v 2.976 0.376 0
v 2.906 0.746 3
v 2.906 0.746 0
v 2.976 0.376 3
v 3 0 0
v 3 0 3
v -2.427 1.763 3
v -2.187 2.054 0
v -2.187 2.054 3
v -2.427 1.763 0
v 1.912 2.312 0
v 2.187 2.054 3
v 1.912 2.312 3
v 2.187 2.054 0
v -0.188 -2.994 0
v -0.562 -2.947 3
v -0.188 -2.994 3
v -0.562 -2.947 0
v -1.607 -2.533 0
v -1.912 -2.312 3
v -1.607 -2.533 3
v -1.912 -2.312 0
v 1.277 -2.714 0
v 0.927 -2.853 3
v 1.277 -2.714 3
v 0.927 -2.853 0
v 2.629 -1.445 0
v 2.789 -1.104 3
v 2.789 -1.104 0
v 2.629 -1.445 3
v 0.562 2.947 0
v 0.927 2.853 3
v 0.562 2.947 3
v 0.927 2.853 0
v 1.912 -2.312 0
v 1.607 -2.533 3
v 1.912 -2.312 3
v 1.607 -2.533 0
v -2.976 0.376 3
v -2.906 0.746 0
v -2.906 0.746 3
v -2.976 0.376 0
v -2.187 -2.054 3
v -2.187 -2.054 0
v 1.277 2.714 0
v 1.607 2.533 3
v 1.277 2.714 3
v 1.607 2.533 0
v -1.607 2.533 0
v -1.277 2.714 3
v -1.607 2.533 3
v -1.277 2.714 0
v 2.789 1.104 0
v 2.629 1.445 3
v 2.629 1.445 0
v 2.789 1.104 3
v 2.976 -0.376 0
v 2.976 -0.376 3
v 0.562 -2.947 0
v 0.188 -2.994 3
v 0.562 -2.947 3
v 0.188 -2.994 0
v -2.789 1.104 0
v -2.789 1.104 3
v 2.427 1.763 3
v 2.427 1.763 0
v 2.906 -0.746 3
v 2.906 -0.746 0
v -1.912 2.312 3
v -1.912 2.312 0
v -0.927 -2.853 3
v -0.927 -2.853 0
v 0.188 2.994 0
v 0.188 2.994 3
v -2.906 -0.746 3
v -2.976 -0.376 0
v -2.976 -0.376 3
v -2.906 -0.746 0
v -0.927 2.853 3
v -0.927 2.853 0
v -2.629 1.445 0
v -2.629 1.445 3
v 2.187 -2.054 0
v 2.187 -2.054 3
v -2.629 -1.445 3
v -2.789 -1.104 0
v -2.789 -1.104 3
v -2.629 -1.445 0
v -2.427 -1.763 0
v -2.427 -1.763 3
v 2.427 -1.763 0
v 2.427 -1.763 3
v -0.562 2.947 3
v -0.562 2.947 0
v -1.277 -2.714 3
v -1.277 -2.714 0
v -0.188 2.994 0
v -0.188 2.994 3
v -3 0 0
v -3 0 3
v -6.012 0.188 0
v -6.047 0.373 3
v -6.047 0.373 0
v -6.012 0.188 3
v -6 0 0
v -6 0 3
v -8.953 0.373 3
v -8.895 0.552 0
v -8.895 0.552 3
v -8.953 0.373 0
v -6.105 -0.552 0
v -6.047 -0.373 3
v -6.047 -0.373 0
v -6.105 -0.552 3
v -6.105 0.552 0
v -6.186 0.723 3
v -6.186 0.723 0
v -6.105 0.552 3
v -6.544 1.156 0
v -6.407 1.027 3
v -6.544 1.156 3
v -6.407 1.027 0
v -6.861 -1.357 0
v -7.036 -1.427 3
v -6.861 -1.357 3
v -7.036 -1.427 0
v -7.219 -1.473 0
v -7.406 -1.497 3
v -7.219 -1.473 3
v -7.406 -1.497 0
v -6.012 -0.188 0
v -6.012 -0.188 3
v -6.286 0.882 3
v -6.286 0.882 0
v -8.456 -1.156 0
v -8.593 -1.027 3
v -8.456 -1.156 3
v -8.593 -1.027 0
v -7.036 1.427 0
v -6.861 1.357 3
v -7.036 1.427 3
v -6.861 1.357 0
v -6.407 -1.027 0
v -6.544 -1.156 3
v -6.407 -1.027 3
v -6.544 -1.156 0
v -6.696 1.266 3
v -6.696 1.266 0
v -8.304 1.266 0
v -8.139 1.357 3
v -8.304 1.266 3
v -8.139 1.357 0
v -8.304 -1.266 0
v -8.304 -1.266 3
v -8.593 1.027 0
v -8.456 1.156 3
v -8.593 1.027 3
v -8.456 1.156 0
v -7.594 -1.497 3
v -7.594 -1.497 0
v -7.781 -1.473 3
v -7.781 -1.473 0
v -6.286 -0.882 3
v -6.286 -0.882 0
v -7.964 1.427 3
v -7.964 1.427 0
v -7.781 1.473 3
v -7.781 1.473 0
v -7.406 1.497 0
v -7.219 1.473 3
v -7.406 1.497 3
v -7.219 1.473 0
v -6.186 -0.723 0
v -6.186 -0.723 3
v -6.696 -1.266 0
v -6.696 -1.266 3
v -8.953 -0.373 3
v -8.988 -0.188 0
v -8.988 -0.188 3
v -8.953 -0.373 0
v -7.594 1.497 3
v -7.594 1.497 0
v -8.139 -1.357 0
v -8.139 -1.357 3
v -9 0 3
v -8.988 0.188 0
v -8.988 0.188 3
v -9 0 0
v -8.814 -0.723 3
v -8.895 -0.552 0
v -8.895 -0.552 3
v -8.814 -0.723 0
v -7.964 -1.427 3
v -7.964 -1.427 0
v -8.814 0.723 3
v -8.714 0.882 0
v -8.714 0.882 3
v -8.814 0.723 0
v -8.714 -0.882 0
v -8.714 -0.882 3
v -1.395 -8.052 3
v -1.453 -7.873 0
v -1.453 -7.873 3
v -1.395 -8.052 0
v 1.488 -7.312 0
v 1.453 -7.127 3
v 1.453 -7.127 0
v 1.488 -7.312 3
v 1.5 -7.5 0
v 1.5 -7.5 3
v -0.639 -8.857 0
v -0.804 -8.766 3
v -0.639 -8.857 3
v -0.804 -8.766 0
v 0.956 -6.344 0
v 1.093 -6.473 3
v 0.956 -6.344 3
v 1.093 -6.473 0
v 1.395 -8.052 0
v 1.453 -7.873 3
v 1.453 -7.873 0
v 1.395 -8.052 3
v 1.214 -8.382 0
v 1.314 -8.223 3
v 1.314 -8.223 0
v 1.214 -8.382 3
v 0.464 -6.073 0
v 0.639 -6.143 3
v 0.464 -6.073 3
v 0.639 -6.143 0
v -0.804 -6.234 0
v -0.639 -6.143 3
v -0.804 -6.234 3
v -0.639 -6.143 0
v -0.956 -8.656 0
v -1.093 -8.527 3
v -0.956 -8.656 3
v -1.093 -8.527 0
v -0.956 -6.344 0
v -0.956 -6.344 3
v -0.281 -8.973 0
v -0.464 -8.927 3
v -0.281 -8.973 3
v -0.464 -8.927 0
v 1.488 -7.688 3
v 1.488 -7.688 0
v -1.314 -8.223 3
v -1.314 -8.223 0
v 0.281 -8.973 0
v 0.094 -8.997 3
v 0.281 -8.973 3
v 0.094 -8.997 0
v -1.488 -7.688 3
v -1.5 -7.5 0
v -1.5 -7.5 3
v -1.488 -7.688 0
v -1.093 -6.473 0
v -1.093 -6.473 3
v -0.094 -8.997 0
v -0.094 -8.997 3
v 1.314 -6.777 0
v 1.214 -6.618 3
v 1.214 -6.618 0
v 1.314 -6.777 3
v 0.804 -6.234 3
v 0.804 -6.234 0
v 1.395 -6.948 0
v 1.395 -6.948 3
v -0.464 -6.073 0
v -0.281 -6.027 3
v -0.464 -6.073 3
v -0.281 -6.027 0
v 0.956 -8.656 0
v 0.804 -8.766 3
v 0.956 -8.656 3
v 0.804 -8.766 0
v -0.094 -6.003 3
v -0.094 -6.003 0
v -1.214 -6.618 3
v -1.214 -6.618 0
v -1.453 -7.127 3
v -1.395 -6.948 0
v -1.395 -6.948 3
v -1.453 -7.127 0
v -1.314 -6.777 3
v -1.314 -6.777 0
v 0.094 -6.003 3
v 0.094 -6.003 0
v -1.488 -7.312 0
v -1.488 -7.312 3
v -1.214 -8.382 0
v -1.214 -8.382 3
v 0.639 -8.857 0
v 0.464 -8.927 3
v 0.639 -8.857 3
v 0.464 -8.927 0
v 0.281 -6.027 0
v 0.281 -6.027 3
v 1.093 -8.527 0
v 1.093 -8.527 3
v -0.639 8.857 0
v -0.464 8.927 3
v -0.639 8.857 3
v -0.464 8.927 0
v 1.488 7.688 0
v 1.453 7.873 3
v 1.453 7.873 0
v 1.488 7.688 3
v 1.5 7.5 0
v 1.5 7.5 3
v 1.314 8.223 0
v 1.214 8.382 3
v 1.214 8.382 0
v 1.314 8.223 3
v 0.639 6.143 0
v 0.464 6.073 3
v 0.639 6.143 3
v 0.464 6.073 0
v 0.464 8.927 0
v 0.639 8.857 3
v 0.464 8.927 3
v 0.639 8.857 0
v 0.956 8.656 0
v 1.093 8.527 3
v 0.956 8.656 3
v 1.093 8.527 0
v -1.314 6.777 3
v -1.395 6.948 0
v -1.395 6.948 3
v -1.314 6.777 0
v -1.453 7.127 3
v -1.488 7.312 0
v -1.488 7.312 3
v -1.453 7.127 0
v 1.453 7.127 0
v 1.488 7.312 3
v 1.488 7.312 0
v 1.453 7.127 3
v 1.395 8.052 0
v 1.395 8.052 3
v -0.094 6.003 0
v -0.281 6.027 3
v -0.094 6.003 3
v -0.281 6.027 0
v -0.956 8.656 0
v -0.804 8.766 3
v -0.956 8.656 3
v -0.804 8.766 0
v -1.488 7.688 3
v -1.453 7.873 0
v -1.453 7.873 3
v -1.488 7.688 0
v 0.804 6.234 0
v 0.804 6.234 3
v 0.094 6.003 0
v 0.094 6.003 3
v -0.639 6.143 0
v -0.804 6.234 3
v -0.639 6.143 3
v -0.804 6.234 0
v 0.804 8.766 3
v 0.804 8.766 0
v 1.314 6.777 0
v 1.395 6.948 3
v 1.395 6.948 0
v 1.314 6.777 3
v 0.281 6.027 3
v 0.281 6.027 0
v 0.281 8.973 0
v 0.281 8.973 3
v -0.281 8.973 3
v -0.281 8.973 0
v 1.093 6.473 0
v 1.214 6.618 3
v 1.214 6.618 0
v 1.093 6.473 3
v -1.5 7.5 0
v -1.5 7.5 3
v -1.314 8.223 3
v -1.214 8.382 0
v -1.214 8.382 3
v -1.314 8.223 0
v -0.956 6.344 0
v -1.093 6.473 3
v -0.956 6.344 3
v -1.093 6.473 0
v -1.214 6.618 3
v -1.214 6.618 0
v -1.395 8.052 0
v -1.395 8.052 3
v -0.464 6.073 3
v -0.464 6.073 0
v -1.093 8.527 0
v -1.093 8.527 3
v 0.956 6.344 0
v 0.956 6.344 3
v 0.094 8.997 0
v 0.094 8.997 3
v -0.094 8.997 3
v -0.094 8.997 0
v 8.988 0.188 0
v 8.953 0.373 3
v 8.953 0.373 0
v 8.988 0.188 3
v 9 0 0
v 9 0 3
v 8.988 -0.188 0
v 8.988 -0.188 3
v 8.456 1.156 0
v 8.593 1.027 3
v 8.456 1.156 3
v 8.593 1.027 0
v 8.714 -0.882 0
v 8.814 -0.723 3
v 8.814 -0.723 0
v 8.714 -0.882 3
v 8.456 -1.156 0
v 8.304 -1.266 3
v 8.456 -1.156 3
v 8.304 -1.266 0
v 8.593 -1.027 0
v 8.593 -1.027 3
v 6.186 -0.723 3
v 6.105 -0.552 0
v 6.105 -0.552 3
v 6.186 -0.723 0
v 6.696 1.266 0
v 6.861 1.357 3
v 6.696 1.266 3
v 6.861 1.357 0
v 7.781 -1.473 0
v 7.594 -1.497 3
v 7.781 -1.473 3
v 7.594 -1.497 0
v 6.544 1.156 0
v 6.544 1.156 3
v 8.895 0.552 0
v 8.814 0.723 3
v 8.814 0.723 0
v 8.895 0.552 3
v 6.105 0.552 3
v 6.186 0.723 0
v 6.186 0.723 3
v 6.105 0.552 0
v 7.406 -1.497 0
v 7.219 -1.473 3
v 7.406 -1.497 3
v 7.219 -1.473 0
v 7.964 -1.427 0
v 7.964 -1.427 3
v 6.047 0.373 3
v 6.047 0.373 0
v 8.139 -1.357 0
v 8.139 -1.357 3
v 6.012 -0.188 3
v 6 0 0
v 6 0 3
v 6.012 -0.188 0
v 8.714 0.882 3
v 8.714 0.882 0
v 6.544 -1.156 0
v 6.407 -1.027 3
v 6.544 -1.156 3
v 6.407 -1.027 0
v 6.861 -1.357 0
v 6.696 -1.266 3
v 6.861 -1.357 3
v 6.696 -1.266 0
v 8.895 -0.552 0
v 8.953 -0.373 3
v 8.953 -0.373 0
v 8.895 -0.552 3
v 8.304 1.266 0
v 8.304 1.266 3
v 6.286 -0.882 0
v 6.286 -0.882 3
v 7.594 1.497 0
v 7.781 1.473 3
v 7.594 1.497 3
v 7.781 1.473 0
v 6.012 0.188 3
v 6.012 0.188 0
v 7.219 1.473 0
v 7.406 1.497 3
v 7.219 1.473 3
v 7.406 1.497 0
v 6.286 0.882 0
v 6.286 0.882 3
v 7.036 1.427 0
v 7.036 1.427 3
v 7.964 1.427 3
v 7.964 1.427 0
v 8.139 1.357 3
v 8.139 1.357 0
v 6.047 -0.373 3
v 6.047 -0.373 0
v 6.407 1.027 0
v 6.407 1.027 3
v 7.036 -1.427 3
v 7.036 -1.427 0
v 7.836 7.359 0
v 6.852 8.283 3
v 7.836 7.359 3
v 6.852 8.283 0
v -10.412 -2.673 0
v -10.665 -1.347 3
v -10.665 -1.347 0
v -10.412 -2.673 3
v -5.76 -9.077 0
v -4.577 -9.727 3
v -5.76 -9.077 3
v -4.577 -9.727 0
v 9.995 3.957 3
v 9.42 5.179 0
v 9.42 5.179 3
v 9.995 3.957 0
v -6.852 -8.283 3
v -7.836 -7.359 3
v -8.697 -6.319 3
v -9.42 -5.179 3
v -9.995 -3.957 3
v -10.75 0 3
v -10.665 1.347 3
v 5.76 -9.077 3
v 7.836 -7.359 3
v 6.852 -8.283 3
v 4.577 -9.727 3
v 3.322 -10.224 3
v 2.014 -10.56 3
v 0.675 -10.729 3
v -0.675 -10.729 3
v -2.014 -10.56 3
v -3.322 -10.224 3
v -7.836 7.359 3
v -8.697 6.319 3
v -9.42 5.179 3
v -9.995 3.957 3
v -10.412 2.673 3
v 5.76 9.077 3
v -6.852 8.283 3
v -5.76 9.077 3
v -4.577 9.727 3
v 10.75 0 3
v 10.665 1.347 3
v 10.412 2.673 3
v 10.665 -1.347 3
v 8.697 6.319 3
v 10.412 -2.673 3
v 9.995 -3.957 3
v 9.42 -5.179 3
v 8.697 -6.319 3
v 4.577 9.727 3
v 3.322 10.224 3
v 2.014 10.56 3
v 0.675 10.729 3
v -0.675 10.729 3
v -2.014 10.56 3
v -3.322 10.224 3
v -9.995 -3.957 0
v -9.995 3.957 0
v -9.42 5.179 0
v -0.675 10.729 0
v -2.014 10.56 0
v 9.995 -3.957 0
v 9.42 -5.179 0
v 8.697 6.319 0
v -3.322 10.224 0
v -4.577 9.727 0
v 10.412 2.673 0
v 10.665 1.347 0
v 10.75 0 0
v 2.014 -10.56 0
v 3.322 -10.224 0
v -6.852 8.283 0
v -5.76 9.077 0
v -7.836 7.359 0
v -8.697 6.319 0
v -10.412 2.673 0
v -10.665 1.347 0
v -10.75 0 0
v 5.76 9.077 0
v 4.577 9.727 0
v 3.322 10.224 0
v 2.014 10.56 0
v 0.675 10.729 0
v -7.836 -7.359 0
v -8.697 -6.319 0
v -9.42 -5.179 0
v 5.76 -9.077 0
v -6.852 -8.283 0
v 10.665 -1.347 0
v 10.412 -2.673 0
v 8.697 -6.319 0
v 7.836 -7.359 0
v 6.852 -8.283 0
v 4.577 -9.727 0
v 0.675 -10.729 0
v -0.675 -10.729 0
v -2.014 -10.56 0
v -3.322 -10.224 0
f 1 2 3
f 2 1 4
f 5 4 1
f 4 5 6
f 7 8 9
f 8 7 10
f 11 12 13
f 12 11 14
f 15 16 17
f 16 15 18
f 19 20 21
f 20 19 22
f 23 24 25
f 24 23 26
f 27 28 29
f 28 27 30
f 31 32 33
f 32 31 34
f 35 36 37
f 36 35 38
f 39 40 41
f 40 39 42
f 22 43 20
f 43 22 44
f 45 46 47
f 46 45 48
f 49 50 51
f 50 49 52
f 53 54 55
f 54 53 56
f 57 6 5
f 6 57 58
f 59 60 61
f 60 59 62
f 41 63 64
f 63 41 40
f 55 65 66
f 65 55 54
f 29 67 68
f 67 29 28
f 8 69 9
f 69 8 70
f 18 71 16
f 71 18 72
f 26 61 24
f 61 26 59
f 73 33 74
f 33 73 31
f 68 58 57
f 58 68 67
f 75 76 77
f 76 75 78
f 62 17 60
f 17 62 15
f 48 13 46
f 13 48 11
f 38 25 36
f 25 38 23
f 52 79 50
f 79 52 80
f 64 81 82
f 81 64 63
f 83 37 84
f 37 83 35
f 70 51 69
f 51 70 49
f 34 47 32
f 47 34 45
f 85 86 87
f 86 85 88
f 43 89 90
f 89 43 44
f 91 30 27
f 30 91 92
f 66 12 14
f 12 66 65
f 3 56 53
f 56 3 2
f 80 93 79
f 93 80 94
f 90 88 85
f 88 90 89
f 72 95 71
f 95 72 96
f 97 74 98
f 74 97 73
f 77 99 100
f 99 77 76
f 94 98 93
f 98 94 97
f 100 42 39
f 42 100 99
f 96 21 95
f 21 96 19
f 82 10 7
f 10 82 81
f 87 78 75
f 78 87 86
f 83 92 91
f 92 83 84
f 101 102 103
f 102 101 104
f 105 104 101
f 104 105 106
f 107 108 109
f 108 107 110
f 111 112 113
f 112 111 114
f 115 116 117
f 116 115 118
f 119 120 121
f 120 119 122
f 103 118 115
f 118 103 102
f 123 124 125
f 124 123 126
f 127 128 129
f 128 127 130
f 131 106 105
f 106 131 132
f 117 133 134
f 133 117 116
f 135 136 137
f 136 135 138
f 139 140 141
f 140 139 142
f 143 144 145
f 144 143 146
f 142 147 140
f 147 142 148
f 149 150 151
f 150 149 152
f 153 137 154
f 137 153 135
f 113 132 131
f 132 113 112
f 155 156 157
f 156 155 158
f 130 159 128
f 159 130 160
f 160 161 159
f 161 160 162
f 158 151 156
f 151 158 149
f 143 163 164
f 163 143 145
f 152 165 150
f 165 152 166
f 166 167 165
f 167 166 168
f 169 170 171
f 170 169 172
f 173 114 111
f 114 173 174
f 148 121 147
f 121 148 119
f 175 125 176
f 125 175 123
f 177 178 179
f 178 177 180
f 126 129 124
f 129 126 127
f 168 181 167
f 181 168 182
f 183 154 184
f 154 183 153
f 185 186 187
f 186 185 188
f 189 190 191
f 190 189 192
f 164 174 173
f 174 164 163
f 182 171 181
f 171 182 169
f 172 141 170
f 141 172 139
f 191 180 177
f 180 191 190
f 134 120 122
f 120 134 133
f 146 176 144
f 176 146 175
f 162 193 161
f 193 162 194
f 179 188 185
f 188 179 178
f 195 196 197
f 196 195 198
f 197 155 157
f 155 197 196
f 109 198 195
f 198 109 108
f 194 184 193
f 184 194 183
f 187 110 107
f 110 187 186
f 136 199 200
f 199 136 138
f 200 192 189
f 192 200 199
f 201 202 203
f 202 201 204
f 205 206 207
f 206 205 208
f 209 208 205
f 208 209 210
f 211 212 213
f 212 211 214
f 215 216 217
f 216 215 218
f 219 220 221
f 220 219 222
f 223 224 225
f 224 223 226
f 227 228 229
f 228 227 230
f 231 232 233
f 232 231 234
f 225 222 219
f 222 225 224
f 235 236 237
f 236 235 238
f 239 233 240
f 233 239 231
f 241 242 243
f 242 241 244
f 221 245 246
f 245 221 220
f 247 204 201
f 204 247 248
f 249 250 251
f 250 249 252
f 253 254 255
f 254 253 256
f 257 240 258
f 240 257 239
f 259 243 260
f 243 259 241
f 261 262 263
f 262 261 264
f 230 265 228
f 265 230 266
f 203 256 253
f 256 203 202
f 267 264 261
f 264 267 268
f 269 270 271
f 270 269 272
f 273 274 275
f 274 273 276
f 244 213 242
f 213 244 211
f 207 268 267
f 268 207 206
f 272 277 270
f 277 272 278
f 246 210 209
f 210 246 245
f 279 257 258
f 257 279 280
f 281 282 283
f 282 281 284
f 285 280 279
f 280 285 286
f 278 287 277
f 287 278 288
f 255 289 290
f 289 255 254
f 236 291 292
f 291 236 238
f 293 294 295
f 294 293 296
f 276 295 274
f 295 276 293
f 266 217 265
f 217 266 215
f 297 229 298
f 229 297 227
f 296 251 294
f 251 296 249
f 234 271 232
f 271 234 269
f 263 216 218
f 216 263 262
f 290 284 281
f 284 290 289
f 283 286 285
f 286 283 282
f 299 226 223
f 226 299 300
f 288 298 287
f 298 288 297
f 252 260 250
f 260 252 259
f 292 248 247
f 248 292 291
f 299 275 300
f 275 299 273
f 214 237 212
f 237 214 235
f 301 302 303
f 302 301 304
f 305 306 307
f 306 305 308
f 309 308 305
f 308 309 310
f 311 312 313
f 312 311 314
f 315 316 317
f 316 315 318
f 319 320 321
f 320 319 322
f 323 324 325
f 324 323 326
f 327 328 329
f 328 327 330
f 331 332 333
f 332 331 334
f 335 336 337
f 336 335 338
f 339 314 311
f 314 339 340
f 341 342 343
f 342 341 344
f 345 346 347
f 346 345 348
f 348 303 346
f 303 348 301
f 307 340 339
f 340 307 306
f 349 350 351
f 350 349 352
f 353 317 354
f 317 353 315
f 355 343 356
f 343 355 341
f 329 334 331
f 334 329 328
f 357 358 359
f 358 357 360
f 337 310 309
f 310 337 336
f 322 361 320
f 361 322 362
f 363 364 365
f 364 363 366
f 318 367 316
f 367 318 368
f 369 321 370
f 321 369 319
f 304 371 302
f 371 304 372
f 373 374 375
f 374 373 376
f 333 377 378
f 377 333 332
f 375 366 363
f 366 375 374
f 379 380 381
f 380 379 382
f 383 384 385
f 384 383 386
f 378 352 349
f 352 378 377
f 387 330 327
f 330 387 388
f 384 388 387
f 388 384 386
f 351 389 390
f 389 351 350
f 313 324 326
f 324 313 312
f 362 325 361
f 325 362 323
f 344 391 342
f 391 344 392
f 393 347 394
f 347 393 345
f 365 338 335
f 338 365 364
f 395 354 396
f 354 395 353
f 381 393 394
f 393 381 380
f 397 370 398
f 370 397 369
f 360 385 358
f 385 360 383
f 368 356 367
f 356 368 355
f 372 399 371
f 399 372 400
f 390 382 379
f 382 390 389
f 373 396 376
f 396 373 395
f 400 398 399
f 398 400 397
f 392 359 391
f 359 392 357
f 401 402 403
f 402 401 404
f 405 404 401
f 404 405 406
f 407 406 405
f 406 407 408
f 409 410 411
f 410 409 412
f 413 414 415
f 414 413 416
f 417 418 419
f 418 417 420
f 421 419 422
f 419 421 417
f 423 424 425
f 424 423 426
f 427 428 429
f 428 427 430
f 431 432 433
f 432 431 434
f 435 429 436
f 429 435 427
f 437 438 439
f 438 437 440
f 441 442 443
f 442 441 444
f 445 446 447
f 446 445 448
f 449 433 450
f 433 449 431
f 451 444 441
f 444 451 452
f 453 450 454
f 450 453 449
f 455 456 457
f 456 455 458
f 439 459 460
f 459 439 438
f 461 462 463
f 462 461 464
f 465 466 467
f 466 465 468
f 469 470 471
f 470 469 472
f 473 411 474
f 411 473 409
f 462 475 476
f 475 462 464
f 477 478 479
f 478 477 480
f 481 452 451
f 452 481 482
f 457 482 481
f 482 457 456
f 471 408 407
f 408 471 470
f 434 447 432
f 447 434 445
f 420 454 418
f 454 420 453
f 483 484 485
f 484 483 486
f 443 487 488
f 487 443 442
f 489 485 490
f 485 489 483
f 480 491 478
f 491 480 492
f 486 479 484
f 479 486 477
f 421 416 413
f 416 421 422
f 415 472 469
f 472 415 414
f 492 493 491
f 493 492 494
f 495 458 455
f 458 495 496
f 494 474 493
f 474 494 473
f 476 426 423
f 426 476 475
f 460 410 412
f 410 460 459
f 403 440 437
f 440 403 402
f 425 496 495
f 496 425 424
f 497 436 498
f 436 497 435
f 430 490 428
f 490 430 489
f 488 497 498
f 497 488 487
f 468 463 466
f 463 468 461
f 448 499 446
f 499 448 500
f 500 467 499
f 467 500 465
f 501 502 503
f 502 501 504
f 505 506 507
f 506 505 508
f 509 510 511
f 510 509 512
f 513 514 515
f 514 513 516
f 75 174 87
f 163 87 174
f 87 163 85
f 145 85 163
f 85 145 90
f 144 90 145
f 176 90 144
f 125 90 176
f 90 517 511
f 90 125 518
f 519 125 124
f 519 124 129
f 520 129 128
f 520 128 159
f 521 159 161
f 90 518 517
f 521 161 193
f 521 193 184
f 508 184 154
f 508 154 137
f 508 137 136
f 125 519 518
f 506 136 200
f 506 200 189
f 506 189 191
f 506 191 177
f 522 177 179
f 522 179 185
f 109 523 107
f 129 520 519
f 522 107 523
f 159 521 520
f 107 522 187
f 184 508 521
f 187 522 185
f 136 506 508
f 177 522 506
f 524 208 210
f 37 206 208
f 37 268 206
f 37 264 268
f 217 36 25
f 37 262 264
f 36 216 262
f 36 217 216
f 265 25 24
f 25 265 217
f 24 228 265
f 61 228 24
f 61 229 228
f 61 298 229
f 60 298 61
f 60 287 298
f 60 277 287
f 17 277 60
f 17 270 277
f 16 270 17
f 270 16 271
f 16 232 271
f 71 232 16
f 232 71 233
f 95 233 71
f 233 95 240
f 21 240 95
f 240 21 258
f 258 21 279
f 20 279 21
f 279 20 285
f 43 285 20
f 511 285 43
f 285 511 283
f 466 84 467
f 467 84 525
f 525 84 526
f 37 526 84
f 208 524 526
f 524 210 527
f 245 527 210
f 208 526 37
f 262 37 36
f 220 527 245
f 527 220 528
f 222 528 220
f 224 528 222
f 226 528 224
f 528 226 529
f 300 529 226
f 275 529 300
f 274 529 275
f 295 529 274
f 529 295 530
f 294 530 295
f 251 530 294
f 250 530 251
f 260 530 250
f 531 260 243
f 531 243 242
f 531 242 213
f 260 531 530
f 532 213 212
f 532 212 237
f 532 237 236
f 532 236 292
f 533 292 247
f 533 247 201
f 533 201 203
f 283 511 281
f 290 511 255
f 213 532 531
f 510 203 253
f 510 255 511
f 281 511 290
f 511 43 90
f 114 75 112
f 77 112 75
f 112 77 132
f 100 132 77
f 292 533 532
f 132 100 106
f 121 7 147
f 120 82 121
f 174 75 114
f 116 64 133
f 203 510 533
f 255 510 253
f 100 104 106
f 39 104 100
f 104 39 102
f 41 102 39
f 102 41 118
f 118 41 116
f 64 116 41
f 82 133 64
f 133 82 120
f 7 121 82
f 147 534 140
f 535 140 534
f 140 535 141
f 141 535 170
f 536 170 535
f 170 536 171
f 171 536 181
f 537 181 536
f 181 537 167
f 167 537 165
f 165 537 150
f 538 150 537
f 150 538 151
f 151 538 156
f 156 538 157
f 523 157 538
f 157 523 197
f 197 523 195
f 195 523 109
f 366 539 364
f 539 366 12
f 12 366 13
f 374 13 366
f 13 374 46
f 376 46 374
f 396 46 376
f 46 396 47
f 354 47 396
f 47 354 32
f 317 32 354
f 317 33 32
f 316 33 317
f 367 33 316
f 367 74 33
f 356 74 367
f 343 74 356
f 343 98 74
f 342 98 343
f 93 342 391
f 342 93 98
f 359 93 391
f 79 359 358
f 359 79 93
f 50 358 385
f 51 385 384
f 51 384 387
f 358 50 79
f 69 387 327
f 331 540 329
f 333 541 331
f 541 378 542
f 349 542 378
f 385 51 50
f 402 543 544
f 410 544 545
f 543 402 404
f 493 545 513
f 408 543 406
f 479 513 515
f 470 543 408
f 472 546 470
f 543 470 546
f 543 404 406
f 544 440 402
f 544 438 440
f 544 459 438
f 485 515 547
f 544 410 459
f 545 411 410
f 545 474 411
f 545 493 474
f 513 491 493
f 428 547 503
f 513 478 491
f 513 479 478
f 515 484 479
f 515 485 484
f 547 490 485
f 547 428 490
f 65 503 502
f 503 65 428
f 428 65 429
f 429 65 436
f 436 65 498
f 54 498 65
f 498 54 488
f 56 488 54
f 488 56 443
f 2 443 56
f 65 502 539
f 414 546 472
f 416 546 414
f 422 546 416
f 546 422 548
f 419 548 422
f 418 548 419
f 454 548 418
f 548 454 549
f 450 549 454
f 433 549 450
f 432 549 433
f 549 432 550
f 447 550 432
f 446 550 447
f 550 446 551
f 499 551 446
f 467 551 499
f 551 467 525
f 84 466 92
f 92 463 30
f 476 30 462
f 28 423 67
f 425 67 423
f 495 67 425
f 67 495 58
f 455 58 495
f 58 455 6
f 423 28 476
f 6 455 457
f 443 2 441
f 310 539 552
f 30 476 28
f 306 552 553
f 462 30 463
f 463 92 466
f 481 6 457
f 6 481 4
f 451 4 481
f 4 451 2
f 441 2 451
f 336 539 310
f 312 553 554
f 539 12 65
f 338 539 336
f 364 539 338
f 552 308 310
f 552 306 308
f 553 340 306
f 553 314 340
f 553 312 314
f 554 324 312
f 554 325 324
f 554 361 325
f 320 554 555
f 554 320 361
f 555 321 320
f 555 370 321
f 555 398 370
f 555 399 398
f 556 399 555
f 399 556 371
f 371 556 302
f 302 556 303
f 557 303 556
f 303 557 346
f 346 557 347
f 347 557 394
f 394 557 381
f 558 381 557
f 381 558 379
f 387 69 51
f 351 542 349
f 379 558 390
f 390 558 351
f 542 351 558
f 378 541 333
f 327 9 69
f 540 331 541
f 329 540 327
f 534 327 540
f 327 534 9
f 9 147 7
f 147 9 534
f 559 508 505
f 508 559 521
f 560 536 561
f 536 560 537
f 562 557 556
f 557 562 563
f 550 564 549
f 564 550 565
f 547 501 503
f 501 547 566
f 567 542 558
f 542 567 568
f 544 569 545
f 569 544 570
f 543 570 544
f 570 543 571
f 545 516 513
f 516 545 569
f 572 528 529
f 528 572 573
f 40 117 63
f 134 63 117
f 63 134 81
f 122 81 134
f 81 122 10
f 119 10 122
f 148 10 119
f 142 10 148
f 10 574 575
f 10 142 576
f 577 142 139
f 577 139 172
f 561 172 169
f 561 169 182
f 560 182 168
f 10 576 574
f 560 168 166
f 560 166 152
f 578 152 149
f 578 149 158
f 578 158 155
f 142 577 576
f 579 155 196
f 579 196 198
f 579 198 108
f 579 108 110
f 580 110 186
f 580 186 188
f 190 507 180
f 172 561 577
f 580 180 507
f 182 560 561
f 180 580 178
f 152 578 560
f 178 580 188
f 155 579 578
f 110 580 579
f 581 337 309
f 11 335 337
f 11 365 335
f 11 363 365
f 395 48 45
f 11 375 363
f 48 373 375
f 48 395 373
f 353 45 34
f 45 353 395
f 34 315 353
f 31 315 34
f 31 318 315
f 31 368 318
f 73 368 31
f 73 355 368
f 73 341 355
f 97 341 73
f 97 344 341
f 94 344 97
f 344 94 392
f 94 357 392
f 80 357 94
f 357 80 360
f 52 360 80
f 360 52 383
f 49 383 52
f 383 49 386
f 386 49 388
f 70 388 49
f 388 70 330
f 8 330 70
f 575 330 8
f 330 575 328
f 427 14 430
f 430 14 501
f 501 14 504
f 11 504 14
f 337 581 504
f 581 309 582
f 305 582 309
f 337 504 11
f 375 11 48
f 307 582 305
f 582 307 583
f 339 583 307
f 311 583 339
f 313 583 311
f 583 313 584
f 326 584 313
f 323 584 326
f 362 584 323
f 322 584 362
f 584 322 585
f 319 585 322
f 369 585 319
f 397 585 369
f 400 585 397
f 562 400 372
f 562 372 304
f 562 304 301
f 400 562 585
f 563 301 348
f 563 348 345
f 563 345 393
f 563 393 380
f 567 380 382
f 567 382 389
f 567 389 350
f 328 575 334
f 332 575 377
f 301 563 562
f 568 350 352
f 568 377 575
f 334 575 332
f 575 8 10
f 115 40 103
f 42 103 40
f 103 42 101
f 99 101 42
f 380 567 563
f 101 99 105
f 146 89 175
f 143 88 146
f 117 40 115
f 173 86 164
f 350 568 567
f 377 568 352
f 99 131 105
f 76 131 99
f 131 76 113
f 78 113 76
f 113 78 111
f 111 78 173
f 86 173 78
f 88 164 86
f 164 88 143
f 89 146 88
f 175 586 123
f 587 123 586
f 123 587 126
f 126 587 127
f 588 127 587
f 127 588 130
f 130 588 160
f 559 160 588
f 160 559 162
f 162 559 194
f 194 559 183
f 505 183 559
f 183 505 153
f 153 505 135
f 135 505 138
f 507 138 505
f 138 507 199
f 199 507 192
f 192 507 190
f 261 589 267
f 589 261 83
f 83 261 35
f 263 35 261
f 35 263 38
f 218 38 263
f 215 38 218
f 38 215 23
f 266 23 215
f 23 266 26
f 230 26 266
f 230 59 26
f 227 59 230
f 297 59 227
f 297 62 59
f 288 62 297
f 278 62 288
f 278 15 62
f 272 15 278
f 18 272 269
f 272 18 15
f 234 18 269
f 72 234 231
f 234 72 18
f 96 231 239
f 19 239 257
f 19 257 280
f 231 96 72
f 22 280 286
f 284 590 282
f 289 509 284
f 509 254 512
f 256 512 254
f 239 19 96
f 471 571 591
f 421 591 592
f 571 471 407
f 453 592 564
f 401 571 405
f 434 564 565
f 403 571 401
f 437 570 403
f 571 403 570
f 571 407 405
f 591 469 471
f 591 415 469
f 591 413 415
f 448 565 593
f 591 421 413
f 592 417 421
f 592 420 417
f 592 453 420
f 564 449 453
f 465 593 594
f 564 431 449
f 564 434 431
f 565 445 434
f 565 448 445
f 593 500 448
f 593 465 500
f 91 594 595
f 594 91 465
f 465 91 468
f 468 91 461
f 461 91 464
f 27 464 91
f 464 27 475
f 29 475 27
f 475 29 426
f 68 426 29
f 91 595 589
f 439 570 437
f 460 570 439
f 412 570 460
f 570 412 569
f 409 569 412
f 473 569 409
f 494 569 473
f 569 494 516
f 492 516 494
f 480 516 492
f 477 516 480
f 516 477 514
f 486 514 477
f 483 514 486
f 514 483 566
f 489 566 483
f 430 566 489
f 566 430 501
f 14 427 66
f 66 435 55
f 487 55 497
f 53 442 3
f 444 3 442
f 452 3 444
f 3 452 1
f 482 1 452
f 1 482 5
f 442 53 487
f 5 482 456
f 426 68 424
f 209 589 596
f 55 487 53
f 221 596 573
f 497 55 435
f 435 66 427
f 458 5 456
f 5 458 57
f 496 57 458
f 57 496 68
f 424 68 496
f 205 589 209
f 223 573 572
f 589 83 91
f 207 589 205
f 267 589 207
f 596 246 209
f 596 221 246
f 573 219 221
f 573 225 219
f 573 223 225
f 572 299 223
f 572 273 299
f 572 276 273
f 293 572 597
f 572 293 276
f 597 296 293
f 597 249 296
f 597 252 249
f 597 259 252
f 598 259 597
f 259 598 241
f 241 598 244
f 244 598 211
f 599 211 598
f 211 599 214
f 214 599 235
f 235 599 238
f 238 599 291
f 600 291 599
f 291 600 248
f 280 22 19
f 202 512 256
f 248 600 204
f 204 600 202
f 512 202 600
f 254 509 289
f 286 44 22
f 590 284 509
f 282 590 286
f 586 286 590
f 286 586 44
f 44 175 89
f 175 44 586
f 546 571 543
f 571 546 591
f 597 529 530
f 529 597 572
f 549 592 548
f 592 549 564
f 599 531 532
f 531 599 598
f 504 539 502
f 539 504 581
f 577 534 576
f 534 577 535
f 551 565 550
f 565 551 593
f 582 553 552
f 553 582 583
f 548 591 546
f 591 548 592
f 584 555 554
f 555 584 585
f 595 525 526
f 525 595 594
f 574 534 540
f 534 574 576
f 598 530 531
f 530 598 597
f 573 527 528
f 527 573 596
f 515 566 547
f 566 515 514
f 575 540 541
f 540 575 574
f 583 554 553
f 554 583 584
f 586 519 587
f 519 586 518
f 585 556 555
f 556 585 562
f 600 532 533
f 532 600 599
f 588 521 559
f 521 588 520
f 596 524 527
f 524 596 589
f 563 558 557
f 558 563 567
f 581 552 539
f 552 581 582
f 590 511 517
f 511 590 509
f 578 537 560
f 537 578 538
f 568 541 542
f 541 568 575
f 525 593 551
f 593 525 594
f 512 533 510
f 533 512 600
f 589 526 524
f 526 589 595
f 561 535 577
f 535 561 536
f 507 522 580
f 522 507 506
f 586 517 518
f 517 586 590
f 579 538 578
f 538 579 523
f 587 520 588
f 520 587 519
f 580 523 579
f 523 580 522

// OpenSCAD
$fn = 50;


difference() {
	union() {
		*color(alpha = 1.0000000000, c = "gray") {
			translate(v = [0, 7, 0]) {
				linear_extrude(height = 1) {
					text(font = "Arial:style=Bold", halign = "center", size = 4.5000000000, text = "COMMENT circle main", valign = "center");
				}
			}
		}
		*color(alpha = 1.0000000000, c = "gray") {
			translate(v = [0, 14, 0]) {
				linear_extrude(height = 1.5000000000) {
					text(font = "Arial:style=Bold", halign = "center", size = 4.5000000000, text = "COMMENT description oobb_circle_shape_p_type_3_depth_1.5_diameter_3_thickness_1.5_width_1.5_height", valign = "center");
				}
			}
		}
		cylinder(h = 3, r = 10.7500000000);
	}
	union() {
		*color(alpha = 1.0000000000, c = "gray") {
			translate(v = [0, 7, 0]) {
				linear_extrude(height = 1) {
					text(font = "Arial:style=Bold", halign = "center", size = 4.5000000000, text = "COMMENT holes main", valign = "center");
				}
			}
		}
		*color(alpha = 1.0000000000, c = "gray") {
			translate(v = [0, 14, 0]) {
				linear_extrude(height = 1.5000000000) {
					text(font = "Arial:style=Bold", halign = "center", size = 4.5000000000, text = "COMMENT description oobb_holes_shape_n_type_1.5_diameter_3_thickness_1.5_width_1.5_height_true_both_holes_true_circle", valign = "center");
				}
			}
		}
		translate(v = [0.0000000000, 0.0000000000, -50.0000000000]) {
			cylinder(h = 100, r = 3.0000000000);
		}
		translate(v = [0.0000000000, 0.0000000000, -50.0000000000]) {
			cylinder(h = 100, r = 3.0000000000);
		}
		translate(v = [0.0000000000, 0.0000000000, -50.0000000000]) {
			cylinder(h = 100, r = 3.0000000000);
		}
		translate(v = [-7.5000000000, 0.0000000000, -50.0000000000]) {
			cylinder(h = 100, r = 1.5000000000);
		}
		translate(v = [0.0000000000, -7.5000000000, -50.0000000000]) {
			cylinder(h = 100, r = 1.5000000000);
		}
		translate(v = [0.0000000000, 0.0000000000, -50.0000000000]) {
			cylinder(h = 100, r = 1.5000000000);
		}
		translate(v = [0.0000000000, 7.5000000000, -50.0000000000]) {
			cylinder(h = 100, r = 1.5000000000);
		}
		translate(v = [7.5000000000, 0.0000000000, -50.0000000000]) {
			cylinder(h = 100, r = 1.5000000000);
		}
		translate(v = [-7.5000000000, 0.0000000000, -50.0000000000]) {
			cylinder(h = 100, r = 1.5000000000);
		}
		translate(v = [0.0000000000, -7.5000000000, -50.0000000000]) {
			cylinder(h = 100, r = 1.5000000000);
		}
		translate(v = [0.0000000000, 0.0000000000, -50.0000000000]) {
			cylinder(h = 100, r = 1.5000000000);
		}
		translate(v = [0.0000000000, 7.5000000000, -50.0000000000]) {
			cylinder(h = 100, r = 1.5000000000);
		}
		translate(v = [7.5000000000, 0.0000000000, -50.0000000000]) {
			cylinder(h = 100, r = 1.5000000000);
		}
		translate(v = [-7.5000000000, 0.0000000000, -50.0000000000]) {
			cylinder(h = 100, r = 1.5000000000);
		}
		translate(v = [0.0000000000, -7.5000000000, -50.0000000000]) {
			cylinder(h = 100, r = 1.5000000000);
		}
		translate(v = [0.0000000000, 0.0000000000, -50.0000000000]) {
			cylinder(h = 100, r = 1.5000000000);
		}
		translate(v = [0.0000000000, 7.5000000000, -50.0000000000]) {
			cylinder(h = 100, r = 1.5000000000);
		}
		translate(v = [7.5000000000, 0.0000000000, -50.0000000000]) {
			cylinder(h = 100, r = 1.5000000000);
		}
	}
}
